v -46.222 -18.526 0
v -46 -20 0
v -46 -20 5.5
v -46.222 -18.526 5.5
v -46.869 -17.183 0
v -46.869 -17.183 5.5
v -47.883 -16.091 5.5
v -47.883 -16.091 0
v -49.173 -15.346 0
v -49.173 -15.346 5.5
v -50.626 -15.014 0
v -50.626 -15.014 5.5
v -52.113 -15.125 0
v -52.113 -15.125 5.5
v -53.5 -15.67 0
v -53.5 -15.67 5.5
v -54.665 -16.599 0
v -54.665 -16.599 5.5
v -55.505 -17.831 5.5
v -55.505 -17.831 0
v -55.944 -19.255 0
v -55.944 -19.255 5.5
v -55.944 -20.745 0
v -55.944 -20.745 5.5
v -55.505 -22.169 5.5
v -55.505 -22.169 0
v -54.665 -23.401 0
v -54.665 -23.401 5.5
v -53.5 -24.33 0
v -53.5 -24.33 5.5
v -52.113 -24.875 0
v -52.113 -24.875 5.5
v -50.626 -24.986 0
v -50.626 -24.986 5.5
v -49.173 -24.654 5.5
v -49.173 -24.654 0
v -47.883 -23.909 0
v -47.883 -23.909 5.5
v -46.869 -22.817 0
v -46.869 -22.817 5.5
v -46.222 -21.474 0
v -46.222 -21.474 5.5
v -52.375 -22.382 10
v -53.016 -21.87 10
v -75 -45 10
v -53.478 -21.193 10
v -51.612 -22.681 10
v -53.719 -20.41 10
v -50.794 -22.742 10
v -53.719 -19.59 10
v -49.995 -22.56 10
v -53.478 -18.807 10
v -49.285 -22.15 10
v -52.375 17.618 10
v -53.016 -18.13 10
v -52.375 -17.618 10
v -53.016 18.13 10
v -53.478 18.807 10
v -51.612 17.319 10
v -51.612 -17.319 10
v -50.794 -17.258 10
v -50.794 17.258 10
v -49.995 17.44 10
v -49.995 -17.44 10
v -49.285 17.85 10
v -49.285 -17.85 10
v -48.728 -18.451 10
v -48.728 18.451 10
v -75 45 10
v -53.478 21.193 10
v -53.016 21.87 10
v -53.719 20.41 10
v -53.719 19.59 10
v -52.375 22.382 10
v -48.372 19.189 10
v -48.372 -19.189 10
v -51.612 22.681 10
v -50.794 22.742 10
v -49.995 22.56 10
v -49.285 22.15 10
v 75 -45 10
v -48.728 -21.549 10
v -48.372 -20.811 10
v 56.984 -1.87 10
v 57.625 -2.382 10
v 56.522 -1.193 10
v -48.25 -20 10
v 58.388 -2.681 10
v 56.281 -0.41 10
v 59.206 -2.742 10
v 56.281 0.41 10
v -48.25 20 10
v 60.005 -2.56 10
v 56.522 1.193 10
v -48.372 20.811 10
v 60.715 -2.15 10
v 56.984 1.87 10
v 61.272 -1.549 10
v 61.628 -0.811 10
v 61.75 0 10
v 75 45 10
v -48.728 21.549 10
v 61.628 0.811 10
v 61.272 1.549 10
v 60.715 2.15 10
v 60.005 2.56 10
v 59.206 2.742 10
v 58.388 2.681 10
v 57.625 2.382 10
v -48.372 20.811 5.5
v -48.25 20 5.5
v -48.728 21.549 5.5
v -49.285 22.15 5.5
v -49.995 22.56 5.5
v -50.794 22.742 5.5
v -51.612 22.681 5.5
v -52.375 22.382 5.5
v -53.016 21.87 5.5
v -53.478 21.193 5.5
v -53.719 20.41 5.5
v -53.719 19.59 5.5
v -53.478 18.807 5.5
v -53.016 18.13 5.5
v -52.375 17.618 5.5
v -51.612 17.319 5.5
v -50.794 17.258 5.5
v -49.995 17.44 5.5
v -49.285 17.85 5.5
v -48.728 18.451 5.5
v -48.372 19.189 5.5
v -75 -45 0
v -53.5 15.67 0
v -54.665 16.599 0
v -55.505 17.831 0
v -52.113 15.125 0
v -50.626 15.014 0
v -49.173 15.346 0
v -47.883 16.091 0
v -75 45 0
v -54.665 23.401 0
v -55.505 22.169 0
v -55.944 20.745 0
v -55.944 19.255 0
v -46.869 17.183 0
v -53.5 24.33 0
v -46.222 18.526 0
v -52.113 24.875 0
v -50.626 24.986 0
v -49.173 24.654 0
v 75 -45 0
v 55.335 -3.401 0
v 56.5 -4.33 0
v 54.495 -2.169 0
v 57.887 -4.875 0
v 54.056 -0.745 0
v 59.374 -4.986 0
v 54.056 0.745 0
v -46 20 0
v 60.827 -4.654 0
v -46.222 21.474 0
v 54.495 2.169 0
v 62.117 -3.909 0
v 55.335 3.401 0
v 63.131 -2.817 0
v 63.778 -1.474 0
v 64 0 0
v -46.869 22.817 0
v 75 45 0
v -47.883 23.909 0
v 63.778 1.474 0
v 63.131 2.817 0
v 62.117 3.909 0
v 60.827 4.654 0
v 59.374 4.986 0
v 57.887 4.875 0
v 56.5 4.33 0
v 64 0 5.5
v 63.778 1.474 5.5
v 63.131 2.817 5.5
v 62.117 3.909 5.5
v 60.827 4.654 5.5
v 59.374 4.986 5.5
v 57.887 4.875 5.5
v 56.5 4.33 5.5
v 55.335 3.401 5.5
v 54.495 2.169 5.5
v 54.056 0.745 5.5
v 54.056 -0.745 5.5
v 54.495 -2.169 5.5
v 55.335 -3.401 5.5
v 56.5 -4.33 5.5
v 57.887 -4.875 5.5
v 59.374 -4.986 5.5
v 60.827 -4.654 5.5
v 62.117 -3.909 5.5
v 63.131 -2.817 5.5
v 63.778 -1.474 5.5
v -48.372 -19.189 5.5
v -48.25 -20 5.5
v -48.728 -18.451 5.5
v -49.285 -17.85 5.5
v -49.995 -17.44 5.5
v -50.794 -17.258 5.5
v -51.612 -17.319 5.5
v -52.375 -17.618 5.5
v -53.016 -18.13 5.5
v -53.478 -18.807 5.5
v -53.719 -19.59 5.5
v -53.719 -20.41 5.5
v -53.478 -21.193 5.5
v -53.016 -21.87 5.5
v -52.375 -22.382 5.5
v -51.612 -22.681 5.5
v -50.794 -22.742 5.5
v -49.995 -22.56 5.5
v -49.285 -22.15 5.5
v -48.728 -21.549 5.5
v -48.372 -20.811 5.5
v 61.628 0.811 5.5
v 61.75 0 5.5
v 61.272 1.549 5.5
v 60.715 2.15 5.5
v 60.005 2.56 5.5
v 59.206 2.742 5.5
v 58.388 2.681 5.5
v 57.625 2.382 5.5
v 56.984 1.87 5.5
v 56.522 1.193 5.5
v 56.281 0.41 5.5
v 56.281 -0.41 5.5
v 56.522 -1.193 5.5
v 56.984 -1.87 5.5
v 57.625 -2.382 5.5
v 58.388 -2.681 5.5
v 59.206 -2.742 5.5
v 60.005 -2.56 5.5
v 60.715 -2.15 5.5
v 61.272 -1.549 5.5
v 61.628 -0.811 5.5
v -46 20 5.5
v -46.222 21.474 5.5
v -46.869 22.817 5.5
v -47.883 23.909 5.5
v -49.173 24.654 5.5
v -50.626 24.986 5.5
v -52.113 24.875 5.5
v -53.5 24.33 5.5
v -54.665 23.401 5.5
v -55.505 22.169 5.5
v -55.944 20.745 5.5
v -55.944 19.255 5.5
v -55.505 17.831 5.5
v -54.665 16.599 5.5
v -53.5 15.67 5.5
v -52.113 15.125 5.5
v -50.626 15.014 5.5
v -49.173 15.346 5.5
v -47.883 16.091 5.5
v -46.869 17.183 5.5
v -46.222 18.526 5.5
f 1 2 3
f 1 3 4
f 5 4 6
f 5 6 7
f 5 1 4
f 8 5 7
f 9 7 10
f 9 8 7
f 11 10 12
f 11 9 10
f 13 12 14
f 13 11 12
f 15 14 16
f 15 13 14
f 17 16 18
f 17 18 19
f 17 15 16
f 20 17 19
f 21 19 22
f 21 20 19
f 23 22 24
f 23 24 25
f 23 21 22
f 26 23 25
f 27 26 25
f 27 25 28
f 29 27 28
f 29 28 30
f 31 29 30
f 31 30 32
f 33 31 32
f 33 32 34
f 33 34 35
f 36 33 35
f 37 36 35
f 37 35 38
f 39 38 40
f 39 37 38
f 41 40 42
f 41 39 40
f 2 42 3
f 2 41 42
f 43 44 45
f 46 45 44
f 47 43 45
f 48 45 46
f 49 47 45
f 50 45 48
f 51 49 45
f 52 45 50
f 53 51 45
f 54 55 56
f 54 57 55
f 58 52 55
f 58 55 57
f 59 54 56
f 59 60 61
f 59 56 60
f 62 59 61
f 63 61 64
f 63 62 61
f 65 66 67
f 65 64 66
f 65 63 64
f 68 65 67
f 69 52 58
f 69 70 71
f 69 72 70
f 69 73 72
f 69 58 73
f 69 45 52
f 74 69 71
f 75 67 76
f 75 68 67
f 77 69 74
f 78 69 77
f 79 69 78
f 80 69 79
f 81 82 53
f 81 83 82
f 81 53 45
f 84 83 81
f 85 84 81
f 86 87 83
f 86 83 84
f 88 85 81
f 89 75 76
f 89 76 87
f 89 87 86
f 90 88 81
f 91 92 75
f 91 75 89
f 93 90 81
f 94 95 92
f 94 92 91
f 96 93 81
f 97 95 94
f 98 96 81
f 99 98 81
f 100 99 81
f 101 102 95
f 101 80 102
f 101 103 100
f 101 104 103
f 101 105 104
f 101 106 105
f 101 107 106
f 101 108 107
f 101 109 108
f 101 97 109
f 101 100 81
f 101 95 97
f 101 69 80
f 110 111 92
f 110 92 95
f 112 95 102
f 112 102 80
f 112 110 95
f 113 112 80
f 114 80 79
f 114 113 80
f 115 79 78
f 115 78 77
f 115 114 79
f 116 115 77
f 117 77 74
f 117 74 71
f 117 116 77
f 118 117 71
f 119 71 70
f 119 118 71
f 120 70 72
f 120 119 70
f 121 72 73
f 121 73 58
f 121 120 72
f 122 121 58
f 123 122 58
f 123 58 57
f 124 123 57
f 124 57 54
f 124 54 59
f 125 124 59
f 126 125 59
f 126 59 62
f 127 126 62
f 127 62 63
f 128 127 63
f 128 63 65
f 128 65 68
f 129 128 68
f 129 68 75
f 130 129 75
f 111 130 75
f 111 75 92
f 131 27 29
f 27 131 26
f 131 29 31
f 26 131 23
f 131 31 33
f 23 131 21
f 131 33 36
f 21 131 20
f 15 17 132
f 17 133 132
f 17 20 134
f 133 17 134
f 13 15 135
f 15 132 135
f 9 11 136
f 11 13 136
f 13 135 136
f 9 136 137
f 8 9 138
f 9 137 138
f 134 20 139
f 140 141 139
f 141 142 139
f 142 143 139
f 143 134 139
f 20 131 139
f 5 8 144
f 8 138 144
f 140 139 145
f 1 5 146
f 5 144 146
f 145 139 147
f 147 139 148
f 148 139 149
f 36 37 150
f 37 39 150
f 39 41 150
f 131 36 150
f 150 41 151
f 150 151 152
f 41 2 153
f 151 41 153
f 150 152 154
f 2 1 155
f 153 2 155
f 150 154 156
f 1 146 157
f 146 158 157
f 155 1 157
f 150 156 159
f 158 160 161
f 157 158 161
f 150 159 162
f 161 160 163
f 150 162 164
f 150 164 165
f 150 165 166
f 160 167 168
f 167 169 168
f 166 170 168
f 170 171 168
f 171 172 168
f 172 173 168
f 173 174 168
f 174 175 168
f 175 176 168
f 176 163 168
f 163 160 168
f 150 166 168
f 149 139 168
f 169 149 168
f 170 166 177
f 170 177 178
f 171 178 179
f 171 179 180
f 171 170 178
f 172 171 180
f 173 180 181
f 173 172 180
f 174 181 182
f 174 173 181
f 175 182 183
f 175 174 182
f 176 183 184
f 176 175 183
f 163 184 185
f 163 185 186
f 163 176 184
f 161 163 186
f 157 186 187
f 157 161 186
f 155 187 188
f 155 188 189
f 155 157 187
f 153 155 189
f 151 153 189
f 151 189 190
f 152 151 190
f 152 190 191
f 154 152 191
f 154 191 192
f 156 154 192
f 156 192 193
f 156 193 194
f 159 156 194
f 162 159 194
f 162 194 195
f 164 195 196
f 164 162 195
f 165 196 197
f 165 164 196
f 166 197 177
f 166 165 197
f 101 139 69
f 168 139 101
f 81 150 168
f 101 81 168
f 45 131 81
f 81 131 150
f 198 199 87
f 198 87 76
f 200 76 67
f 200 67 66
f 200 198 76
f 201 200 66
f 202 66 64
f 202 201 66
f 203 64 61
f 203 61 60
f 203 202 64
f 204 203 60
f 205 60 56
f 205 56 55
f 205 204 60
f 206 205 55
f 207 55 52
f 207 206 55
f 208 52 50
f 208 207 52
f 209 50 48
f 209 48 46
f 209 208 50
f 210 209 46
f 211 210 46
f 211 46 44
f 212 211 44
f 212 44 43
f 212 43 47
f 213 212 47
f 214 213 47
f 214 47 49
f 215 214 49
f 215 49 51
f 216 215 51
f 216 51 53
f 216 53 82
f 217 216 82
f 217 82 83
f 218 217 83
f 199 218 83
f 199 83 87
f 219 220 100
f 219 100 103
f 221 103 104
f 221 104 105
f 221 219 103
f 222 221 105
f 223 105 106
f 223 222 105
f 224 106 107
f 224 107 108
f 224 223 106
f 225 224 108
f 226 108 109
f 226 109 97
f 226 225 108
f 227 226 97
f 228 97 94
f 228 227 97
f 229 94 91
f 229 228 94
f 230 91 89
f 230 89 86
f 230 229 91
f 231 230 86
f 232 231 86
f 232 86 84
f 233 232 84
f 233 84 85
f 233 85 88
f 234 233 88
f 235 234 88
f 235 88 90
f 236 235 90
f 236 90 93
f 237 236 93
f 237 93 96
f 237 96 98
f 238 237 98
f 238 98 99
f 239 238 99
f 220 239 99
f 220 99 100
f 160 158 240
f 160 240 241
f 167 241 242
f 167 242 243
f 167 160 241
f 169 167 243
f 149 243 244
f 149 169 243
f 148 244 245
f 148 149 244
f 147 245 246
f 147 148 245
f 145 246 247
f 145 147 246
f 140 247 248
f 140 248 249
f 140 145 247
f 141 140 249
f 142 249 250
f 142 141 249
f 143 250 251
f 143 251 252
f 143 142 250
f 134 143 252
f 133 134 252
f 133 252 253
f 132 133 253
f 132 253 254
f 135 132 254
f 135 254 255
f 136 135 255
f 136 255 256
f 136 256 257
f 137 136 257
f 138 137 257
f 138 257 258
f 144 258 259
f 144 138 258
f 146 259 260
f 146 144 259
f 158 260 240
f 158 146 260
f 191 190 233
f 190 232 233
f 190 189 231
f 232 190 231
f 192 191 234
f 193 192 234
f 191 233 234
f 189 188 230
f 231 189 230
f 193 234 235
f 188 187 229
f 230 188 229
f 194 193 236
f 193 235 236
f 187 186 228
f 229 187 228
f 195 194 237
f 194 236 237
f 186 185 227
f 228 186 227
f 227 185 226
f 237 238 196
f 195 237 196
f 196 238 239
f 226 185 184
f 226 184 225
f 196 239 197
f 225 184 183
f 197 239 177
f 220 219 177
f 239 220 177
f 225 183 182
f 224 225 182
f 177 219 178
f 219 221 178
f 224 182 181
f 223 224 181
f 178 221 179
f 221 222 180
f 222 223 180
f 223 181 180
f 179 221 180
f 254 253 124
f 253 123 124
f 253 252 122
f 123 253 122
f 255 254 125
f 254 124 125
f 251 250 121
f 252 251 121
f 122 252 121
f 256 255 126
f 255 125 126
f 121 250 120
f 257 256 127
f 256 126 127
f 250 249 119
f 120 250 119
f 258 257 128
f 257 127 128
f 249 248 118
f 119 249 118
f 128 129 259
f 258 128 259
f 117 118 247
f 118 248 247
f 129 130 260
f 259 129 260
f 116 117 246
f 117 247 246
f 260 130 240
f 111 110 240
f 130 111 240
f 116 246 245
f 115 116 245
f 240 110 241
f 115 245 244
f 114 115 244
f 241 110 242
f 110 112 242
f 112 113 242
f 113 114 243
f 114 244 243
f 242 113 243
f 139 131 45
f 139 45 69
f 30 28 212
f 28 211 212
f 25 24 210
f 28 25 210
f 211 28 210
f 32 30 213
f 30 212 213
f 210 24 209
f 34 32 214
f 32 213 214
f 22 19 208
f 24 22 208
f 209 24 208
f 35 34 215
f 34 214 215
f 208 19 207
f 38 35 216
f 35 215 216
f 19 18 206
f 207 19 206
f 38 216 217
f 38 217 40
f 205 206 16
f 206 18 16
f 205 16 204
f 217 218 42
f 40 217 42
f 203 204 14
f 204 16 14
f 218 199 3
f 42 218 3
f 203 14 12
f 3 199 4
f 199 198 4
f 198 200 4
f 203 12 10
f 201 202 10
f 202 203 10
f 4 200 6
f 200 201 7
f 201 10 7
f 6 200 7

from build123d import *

# Parameters (mm, degrees)
F0_W     = 150
F0_H     = 90
F0_R     = 5
F0_R_2   = 2.75
F1_DEPTH = 10
F2_DEPTH = 5.5


with BuildPart() as f1:
    # F0 (on Top) → F1 (new body)
    with BuildSketch(Plane.XY):
        Rectangle(F0_W, F0_H)
        with Locations((-51, -20)):
            Circle(F0_R, mode=Mode.SUBTRACT)
        with Locations((-51, 20)):
            Circle(F0_R, mode=Mode.SUBTRACT)
        with Locations((59, 0)):
            Circle(F0_R, mode=Mode.SUBTRACT)
        with Locations((-51, 20)):
            Circle(F0_R)
        with Locations((-51, 20)):
            Circle(F0_R_2, mode=Mode.SUBTRACT)
        with Locations((-51, -20)):
            Circle(F0_R)
        with Locations((-51, -20)):
            Circle(F0_R_2, mode=Mode.SUBTRACT)
        with Locations((59, 0)):
            Circle(F0_R)
        with Locations((59, 0)):
            Circle(F0_R_2, mode=Mode.SUBTRACT)
    extrude(amount=F1_DEPTH)

    # F0 (on Top) → F2 (cut)
    with BuildSketch(Plane.XY):
        with Locations((-51, -20)):
            Circle(F0_R)
        with Locations((-51, -20)):
            Circle(F0_R_2, mode=Mode.SUBTRACT)
        with Locations((-51, 20)):
            Circle(F0_R)
        with Locations((-51, 20)):
            Circle(F0_R_2, mode=Mode.SUBTRACT)
        with Locations((59, 0)):
            Circle(F0_R)
        with Locations((59, 0)):
            Circle(F0_R_2, mode=Mode.SUBTRACT)
    extrude(amount=F2_DEPTH, mode=Mode.SUBTRACT)


solid = f1.part
